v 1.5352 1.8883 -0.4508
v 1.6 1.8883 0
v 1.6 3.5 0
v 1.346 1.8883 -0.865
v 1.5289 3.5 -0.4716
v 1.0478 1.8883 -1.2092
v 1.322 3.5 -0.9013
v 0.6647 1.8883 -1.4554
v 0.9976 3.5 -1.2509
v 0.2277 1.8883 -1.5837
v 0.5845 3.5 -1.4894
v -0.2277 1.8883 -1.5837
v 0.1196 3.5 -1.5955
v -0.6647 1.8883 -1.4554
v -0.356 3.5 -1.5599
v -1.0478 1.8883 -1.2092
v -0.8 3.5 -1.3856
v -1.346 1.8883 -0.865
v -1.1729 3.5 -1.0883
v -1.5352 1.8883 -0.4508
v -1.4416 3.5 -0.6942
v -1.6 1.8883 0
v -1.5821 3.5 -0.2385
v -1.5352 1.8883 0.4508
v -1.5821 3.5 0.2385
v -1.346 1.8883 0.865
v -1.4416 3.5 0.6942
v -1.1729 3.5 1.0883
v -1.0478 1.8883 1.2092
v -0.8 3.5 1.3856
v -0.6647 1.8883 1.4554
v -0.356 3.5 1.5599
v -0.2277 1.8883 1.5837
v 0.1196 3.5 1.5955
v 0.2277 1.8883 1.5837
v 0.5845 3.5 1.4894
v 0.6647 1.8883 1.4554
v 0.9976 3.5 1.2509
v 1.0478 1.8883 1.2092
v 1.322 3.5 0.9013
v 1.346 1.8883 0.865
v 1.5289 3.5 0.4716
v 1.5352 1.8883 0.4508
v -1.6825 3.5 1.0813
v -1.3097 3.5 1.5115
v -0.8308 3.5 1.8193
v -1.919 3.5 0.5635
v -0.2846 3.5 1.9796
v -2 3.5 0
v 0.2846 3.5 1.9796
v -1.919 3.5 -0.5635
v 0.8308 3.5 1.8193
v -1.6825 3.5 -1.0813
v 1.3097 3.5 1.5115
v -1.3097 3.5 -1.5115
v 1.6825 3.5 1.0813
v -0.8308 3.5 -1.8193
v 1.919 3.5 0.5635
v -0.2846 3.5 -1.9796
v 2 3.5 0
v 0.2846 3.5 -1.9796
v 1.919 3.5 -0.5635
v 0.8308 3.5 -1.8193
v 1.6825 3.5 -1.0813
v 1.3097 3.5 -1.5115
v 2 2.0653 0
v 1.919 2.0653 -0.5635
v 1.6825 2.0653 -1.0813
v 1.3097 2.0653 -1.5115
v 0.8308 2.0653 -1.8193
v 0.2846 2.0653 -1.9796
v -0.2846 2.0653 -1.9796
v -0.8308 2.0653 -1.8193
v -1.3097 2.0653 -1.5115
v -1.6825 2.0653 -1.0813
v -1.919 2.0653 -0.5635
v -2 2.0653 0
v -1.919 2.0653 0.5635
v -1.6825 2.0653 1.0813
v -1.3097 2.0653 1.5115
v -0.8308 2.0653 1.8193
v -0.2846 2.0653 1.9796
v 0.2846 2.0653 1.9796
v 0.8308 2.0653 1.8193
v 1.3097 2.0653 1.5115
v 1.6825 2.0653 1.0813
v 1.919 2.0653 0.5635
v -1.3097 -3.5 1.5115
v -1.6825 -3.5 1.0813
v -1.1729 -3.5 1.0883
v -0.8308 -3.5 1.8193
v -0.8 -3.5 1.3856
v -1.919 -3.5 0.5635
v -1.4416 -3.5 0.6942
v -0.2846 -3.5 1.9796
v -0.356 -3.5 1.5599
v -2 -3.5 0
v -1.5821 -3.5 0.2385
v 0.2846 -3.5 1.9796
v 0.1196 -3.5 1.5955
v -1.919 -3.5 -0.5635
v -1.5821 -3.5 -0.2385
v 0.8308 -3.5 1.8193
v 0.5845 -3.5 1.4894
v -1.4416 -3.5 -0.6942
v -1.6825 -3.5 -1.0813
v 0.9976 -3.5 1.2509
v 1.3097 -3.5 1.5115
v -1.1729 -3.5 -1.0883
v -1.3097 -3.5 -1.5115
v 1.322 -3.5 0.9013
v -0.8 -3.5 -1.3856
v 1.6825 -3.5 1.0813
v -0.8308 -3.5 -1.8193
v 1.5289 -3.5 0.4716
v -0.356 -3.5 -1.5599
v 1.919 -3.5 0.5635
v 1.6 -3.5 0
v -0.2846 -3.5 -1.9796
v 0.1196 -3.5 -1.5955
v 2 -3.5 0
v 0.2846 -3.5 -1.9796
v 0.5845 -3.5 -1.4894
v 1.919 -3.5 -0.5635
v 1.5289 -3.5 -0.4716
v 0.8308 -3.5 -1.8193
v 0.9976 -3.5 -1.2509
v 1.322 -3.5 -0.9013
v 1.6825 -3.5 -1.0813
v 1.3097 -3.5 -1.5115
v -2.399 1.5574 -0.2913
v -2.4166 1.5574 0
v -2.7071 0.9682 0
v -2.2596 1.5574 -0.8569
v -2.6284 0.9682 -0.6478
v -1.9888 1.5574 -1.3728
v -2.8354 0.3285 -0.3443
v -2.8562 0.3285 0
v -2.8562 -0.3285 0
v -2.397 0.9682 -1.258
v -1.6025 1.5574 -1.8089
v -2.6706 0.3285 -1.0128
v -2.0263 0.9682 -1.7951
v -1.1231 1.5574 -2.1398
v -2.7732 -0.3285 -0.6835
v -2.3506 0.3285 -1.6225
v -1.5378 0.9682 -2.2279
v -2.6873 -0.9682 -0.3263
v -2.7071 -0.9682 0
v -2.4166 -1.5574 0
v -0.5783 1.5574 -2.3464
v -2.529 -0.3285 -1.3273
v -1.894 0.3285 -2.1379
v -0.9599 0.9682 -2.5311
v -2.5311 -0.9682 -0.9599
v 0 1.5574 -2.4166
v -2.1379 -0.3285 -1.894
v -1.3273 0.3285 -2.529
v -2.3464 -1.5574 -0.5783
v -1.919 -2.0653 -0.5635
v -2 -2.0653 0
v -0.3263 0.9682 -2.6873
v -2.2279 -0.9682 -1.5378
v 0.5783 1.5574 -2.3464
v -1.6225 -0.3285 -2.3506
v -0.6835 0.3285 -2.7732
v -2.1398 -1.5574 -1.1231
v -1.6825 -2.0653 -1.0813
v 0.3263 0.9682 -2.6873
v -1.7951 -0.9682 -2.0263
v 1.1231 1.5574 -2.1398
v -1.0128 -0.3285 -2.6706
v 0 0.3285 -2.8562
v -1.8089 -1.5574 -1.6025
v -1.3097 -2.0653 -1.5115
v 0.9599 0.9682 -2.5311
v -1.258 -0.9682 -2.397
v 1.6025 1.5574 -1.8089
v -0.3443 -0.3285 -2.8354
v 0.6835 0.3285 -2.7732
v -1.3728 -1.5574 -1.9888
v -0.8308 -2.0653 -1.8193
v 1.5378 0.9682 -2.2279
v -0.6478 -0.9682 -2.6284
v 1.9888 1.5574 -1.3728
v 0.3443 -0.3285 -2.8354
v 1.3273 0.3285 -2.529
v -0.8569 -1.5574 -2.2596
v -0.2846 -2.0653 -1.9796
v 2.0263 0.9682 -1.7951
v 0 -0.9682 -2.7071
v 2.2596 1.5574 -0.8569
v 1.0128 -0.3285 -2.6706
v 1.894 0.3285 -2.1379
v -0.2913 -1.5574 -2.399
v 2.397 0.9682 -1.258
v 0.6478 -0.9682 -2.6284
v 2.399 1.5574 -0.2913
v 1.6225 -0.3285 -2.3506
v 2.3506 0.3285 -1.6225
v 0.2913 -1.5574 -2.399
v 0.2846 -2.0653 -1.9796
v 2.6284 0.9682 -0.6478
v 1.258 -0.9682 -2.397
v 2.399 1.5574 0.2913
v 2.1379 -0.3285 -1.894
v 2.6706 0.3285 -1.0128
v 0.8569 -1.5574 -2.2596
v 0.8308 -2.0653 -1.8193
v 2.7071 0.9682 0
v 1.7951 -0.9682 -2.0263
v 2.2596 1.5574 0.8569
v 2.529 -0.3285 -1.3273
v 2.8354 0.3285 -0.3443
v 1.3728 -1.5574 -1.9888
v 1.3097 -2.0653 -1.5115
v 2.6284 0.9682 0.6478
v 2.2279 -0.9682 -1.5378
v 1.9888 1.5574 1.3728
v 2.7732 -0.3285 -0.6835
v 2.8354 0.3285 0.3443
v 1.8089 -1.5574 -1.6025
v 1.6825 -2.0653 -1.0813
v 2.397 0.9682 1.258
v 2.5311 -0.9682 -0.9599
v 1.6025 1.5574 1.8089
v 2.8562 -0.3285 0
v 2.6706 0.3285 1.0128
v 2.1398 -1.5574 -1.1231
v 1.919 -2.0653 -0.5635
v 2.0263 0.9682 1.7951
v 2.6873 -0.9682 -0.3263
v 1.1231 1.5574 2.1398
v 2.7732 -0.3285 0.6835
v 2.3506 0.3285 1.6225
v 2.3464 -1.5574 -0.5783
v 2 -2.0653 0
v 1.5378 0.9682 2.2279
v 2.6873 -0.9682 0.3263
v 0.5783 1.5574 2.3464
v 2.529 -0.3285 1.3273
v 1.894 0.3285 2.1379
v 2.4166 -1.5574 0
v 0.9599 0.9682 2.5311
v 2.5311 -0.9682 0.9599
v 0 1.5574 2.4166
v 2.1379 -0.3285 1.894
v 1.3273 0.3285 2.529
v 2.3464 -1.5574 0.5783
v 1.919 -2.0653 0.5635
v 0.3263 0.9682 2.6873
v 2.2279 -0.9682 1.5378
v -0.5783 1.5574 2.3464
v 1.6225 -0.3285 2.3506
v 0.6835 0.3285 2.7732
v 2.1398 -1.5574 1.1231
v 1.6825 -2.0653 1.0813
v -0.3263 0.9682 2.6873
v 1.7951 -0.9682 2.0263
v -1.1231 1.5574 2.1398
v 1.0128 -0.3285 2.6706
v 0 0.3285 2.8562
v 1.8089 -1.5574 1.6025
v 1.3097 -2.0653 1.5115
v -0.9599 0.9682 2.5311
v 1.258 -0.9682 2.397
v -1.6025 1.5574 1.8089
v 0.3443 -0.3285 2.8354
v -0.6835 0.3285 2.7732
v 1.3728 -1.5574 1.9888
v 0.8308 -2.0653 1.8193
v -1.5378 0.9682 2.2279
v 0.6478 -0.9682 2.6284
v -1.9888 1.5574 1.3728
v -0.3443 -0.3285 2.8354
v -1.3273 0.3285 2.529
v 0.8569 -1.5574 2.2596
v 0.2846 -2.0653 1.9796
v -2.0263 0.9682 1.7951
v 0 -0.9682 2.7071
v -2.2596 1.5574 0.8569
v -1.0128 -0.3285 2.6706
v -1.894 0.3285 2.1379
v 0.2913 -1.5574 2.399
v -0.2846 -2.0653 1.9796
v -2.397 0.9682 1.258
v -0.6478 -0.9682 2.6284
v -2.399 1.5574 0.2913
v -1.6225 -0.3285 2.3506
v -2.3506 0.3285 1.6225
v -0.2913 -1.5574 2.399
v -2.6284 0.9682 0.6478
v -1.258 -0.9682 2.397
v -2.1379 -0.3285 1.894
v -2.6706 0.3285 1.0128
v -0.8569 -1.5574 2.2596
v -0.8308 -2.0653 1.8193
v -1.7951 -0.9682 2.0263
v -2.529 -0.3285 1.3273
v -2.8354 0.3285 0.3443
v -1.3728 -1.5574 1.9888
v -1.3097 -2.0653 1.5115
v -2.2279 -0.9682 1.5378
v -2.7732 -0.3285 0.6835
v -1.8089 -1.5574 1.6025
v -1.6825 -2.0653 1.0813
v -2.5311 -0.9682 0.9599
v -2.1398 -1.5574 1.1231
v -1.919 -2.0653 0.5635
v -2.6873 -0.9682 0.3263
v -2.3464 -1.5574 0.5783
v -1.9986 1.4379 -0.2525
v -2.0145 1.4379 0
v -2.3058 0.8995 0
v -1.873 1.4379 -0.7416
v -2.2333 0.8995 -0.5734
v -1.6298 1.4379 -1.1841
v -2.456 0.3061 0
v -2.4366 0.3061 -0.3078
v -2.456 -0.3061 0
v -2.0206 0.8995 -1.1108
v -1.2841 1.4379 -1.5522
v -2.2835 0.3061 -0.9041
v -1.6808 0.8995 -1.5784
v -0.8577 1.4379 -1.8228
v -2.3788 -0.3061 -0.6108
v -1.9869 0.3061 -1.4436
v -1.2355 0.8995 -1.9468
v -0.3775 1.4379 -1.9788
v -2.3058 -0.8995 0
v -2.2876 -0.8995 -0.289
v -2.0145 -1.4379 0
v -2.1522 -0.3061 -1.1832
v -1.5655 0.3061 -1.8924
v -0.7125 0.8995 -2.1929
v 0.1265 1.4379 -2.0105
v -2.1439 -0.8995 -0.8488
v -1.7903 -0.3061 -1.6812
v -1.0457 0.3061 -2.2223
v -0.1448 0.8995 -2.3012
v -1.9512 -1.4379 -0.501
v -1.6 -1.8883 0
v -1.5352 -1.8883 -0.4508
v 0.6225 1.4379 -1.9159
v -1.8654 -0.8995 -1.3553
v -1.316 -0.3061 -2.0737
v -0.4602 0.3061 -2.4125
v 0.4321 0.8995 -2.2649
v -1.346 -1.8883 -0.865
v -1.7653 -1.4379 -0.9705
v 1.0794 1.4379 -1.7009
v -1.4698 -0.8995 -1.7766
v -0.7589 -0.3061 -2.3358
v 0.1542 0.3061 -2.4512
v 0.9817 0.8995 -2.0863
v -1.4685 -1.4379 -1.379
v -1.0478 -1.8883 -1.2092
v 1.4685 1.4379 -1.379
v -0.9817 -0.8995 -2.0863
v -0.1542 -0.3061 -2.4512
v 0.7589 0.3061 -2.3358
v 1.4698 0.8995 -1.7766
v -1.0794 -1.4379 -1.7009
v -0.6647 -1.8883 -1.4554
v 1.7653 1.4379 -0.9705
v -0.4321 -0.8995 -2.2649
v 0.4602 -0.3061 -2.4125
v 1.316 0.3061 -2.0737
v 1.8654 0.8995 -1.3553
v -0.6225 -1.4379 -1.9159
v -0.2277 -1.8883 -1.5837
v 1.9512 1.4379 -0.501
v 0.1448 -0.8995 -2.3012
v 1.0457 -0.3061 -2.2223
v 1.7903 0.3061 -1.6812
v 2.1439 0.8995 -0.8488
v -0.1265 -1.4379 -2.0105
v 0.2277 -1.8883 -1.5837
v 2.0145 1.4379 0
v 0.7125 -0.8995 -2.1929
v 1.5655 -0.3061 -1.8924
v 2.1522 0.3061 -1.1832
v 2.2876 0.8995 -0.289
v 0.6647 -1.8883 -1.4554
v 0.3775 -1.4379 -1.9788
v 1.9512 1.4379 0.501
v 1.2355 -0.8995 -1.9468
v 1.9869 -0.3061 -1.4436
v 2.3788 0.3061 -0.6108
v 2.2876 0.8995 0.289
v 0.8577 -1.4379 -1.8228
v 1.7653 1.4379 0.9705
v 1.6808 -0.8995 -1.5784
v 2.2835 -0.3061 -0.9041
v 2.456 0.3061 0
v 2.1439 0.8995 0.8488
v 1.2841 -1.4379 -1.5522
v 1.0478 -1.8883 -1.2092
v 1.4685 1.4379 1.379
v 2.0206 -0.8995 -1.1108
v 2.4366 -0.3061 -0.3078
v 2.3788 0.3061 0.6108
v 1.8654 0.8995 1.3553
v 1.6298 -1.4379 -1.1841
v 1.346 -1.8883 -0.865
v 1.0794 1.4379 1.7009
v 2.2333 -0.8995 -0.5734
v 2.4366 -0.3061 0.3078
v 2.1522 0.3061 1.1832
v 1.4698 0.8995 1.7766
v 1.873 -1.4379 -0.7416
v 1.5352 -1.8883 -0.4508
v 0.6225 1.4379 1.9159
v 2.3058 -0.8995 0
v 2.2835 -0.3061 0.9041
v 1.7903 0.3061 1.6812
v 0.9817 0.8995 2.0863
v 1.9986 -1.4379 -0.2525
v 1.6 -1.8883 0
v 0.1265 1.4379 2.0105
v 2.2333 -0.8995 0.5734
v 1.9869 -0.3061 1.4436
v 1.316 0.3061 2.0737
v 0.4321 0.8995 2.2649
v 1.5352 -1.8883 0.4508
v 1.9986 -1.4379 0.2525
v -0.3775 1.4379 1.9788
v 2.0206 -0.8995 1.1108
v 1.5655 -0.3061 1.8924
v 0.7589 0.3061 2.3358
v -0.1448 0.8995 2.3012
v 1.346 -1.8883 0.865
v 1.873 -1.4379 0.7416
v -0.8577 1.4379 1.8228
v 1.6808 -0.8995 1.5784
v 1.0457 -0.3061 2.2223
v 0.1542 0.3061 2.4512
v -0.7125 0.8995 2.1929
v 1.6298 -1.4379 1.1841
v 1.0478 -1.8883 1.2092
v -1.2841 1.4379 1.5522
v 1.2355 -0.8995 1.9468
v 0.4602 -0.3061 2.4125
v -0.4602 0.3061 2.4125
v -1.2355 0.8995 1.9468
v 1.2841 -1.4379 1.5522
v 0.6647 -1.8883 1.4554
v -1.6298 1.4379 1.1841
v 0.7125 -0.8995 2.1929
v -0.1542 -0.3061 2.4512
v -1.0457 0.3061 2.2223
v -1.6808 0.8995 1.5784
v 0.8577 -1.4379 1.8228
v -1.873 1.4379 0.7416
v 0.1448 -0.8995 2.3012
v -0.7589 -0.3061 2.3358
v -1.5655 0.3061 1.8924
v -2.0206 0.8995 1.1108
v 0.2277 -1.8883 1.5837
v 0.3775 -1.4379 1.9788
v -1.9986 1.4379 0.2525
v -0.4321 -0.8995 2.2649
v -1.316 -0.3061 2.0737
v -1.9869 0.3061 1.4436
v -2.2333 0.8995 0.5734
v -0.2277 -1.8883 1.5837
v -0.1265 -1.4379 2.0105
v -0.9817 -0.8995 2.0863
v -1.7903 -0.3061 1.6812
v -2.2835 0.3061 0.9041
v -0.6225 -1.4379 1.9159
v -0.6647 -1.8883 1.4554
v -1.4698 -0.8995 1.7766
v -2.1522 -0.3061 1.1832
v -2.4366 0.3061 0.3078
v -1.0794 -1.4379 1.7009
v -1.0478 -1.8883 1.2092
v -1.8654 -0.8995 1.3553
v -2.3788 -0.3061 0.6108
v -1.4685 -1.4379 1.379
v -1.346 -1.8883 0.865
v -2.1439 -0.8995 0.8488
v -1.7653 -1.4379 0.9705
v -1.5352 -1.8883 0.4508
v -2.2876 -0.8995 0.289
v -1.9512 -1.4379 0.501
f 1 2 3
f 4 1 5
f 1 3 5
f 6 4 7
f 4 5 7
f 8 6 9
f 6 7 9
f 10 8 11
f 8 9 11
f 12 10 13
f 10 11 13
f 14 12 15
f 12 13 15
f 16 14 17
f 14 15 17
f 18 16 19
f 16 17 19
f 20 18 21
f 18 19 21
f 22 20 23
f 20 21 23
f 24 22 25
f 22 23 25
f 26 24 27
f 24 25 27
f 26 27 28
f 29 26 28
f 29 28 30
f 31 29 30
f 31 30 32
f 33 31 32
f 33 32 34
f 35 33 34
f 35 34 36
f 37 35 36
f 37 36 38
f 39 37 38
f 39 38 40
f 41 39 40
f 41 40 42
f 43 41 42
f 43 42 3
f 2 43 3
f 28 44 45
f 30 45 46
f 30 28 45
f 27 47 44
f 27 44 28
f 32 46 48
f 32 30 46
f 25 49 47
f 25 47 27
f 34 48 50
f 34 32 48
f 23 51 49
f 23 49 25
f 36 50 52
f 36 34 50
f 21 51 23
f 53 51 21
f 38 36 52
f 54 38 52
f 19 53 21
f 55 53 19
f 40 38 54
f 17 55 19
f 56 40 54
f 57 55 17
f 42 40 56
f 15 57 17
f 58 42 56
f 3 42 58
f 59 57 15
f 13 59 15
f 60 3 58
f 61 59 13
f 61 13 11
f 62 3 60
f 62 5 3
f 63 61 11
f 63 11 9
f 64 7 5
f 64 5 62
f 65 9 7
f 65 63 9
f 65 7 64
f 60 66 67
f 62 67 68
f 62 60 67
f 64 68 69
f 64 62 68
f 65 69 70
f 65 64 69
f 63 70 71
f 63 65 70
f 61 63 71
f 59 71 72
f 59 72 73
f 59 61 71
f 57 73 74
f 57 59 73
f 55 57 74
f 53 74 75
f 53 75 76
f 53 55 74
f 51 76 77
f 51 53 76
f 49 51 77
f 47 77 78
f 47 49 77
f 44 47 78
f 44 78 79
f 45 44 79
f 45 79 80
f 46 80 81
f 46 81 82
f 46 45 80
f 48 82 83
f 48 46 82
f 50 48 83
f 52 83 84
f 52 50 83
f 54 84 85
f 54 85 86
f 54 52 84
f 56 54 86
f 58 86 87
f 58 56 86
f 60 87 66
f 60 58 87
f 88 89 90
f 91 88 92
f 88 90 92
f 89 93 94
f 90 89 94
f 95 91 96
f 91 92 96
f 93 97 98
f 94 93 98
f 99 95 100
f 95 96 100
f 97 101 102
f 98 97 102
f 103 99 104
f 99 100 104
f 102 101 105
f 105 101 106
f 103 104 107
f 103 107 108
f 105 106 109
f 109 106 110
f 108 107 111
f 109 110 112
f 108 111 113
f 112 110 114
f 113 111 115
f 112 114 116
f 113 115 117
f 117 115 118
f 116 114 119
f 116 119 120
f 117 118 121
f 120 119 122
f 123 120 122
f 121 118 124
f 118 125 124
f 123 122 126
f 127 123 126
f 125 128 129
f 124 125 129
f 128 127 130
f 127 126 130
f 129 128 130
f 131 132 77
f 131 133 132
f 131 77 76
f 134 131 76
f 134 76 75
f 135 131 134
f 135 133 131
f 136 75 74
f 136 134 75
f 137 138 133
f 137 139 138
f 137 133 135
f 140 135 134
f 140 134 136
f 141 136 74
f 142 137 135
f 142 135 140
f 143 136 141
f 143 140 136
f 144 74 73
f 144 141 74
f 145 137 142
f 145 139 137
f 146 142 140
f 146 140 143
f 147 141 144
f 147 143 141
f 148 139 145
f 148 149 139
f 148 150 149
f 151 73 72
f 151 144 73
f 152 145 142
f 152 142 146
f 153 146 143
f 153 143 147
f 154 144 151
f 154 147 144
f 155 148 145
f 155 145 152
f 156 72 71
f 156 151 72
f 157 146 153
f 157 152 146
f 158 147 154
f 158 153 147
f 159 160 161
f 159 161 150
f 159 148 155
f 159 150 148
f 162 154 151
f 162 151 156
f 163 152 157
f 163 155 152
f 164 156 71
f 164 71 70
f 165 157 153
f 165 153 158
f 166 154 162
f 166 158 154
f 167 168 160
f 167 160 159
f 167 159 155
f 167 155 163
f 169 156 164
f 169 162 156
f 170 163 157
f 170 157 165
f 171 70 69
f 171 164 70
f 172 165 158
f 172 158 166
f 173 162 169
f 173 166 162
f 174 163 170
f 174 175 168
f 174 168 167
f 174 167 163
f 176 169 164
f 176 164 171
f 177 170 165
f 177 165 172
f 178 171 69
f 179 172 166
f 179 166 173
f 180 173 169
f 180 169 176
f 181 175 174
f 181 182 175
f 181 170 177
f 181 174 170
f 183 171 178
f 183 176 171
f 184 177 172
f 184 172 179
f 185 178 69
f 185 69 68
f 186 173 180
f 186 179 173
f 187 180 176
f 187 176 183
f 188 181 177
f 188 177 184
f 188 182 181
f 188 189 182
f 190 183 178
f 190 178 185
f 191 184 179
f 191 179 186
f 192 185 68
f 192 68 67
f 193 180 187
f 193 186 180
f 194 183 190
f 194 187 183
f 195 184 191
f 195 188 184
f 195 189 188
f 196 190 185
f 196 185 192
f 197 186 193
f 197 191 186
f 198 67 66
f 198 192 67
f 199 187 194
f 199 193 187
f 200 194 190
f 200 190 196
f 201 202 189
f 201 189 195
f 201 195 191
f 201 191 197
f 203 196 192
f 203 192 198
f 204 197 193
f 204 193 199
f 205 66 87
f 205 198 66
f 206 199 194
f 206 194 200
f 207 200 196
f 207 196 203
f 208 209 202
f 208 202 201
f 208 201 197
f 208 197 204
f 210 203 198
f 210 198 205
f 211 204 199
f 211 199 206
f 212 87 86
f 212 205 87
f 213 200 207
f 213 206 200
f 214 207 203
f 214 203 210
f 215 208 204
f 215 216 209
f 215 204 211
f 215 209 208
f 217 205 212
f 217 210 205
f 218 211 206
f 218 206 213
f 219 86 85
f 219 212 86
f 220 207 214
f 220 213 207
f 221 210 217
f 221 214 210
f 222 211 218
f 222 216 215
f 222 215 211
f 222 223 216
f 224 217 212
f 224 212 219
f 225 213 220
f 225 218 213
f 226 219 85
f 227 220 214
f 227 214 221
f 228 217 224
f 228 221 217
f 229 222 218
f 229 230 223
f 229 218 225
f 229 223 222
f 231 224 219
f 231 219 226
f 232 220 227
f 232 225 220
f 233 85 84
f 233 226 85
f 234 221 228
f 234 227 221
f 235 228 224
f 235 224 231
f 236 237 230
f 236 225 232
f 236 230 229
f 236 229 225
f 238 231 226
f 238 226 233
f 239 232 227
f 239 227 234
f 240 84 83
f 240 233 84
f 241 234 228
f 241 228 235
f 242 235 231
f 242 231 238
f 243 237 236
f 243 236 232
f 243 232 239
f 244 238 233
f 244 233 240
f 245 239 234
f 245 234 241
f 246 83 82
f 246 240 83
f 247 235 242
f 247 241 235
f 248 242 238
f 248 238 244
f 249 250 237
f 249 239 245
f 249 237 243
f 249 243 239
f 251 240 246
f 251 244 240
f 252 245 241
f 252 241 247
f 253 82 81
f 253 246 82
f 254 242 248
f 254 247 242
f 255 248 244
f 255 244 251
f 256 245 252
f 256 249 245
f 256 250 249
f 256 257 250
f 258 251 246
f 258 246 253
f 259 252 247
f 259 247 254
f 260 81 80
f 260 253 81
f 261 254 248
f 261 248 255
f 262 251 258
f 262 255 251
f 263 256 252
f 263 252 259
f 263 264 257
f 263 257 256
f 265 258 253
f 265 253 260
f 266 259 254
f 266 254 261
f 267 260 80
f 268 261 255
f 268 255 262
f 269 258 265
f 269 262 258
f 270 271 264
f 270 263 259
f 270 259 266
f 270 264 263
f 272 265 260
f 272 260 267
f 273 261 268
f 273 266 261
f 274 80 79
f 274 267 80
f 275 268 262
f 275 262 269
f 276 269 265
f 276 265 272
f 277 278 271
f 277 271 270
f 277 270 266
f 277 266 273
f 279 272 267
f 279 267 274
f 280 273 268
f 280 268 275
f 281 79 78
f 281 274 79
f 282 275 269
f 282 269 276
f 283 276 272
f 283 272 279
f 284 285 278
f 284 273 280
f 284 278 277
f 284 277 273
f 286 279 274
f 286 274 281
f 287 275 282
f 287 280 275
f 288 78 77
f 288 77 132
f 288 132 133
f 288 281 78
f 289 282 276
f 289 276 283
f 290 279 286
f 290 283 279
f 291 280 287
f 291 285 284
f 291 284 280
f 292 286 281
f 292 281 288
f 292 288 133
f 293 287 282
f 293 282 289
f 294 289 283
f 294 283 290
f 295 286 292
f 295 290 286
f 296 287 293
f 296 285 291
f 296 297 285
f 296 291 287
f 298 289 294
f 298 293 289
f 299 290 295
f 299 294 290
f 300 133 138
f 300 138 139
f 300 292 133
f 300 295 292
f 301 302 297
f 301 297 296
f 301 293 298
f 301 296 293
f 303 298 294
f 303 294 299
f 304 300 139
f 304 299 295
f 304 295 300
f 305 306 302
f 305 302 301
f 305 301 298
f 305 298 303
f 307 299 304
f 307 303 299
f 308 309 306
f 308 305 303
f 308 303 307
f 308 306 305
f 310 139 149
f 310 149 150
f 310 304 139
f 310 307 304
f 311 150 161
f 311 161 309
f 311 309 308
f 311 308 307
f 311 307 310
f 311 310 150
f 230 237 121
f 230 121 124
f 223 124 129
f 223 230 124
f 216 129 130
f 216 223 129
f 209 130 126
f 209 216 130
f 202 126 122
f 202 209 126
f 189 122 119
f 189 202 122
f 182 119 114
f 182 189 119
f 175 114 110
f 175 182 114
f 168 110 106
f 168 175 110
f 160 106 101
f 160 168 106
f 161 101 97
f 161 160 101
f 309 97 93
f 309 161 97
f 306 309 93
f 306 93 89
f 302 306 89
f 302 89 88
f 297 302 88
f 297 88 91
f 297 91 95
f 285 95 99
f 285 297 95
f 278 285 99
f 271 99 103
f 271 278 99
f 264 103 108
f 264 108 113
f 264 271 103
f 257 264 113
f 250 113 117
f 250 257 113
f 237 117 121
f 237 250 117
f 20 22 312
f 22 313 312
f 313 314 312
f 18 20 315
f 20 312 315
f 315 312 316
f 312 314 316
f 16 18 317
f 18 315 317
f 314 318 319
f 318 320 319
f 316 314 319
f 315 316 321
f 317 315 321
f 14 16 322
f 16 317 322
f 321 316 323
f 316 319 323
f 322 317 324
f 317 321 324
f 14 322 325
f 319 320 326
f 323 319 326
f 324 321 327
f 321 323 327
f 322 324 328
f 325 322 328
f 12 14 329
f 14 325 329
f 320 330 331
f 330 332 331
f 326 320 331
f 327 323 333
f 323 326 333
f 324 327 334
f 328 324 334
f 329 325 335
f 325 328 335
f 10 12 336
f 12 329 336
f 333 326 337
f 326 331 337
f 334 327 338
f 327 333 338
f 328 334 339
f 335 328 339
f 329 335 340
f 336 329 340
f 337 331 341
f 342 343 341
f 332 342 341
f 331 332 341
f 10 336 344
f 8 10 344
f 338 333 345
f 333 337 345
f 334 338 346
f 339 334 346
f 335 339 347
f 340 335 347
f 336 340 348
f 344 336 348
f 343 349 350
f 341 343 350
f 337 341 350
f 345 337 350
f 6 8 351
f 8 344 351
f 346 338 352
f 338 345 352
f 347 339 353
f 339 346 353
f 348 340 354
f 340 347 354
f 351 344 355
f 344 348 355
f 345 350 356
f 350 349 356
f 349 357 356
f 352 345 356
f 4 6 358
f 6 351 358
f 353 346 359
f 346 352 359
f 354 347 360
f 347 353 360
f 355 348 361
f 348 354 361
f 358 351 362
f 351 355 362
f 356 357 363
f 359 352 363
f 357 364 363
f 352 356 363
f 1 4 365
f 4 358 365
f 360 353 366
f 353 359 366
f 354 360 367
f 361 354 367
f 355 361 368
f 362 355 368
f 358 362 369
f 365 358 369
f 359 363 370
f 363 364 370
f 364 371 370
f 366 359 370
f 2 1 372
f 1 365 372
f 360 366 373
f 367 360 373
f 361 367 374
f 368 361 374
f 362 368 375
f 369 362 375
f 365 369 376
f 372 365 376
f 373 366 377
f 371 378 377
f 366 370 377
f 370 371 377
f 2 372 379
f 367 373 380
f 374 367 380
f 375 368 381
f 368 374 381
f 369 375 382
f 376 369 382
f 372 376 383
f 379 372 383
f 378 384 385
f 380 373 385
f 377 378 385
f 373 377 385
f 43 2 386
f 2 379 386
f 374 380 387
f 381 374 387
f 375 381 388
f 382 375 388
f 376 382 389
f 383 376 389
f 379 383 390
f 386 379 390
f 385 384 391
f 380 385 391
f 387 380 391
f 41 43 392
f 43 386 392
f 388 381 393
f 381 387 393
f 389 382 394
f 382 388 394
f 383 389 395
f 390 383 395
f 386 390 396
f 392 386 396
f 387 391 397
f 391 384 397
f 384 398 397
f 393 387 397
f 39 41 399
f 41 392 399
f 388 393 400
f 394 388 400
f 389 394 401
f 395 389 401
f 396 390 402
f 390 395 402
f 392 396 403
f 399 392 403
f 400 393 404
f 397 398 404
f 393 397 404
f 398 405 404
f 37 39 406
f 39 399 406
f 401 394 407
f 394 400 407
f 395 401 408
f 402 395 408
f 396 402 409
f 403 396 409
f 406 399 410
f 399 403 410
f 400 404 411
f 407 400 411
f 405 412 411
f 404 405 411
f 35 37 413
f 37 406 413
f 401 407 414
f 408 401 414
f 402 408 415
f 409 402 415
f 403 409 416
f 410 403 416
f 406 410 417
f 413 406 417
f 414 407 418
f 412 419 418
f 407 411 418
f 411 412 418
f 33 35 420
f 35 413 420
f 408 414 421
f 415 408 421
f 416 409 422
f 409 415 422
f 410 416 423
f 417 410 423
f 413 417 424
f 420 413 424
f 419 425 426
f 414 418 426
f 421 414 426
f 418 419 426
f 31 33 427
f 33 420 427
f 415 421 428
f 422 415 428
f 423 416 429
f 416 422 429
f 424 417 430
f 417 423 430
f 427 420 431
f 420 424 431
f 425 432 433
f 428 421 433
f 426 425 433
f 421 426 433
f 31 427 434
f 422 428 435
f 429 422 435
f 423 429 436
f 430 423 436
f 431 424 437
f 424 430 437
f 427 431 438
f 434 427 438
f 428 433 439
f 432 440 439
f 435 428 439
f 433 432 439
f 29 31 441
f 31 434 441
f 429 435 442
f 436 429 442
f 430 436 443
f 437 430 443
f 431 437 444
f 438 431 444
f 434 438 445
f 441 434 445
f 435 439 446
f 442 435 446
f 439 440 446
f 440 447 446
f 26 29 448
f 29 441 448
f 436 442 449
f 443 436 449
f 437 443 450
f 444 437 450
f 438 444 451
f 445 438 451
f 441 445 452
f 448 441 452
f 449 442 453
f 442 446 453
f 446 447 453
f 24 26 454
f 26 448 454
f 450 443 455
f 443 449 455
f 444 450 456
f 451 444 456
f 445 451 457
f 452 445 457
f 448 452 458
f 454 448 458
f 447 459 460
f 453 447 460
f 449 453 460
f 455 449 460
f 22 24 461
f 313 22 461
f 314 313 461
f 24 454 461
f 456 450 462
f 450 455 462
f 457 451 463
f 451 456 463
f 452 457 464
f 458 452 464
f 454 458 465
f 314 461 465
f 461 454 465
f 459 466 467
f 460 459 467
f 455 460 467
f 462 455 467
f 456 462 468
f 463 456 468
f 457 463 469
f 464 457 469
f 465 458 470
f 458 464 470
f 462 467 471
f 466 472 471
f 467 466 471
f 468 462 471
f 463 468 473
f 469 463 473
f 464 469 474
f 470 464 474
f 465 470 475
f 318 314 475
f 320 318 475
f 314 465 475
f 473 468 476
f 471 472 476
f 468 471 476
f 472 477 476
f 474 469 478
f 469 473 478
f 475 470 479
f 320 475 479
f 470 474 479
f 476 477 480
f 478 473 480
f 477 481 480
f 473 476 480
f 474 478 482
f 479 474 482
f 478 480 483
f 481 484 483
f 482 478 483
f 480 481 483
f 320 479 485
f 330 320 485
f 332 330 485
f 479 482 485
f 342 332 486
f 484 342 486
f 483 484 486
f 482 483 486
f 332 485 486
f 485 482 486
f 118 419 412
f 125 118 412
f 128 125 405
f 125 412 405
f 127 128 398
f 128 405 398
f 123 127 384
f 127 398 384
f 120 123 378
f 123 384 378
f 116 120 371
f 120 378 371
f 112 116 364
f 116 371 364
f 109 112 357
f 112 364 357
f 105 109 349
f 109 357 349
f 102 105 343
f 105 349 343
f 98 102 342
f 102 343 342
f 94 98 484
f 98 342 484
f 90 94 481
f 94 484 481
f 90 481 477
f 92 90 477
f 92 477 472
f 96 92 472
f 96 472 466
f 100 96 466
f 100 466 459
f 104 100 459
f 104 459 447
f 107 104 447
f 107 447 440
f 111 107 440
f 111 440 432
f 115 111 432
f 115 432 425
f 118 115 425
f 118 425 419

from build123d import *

# Parameters (mm, degrees)
SKETCH2_R           = 2
BOSS_EXTRUDE1_DEPTH = 3.5
SHELL1_T            = -0.4


with BuildPart() as part:
    # Sketch1 → Revolve1 (revolve)
    with BuildSketch(Plane.XY):
        with BuildLine():
            Line((0, -2.875), (0, 2.875))
            ThreePointArc((0, 2.875), (-2.875, 0), (0, -2.875))
        make_face()
    revolve(axis=Axis((0, 55, 0), (0, -1, 0)))

    # Sketch2 → Boss-Extrude1 (add, symmetric)
    with BuildSketch(Plane(origin=(0, 0, 0), x_dir=(1, 0, 0), z_dir=(0, 1, 0))):
        Circle(SKETCH2_R)
    extrude(amount=BOSS_EXTRUDE1_DEPTH, both=True)

    # Shell1
    shell1_openings = [part.faces().sort_by_distance(p)[0] for p in [
        (0, 3.5, 0),
        (0, -3.5, 0),
    ]]
    offset(amount=SHELL1_T, openings=shell1_openings, kind=Kind.INTERSECTION)


solid = part.part
